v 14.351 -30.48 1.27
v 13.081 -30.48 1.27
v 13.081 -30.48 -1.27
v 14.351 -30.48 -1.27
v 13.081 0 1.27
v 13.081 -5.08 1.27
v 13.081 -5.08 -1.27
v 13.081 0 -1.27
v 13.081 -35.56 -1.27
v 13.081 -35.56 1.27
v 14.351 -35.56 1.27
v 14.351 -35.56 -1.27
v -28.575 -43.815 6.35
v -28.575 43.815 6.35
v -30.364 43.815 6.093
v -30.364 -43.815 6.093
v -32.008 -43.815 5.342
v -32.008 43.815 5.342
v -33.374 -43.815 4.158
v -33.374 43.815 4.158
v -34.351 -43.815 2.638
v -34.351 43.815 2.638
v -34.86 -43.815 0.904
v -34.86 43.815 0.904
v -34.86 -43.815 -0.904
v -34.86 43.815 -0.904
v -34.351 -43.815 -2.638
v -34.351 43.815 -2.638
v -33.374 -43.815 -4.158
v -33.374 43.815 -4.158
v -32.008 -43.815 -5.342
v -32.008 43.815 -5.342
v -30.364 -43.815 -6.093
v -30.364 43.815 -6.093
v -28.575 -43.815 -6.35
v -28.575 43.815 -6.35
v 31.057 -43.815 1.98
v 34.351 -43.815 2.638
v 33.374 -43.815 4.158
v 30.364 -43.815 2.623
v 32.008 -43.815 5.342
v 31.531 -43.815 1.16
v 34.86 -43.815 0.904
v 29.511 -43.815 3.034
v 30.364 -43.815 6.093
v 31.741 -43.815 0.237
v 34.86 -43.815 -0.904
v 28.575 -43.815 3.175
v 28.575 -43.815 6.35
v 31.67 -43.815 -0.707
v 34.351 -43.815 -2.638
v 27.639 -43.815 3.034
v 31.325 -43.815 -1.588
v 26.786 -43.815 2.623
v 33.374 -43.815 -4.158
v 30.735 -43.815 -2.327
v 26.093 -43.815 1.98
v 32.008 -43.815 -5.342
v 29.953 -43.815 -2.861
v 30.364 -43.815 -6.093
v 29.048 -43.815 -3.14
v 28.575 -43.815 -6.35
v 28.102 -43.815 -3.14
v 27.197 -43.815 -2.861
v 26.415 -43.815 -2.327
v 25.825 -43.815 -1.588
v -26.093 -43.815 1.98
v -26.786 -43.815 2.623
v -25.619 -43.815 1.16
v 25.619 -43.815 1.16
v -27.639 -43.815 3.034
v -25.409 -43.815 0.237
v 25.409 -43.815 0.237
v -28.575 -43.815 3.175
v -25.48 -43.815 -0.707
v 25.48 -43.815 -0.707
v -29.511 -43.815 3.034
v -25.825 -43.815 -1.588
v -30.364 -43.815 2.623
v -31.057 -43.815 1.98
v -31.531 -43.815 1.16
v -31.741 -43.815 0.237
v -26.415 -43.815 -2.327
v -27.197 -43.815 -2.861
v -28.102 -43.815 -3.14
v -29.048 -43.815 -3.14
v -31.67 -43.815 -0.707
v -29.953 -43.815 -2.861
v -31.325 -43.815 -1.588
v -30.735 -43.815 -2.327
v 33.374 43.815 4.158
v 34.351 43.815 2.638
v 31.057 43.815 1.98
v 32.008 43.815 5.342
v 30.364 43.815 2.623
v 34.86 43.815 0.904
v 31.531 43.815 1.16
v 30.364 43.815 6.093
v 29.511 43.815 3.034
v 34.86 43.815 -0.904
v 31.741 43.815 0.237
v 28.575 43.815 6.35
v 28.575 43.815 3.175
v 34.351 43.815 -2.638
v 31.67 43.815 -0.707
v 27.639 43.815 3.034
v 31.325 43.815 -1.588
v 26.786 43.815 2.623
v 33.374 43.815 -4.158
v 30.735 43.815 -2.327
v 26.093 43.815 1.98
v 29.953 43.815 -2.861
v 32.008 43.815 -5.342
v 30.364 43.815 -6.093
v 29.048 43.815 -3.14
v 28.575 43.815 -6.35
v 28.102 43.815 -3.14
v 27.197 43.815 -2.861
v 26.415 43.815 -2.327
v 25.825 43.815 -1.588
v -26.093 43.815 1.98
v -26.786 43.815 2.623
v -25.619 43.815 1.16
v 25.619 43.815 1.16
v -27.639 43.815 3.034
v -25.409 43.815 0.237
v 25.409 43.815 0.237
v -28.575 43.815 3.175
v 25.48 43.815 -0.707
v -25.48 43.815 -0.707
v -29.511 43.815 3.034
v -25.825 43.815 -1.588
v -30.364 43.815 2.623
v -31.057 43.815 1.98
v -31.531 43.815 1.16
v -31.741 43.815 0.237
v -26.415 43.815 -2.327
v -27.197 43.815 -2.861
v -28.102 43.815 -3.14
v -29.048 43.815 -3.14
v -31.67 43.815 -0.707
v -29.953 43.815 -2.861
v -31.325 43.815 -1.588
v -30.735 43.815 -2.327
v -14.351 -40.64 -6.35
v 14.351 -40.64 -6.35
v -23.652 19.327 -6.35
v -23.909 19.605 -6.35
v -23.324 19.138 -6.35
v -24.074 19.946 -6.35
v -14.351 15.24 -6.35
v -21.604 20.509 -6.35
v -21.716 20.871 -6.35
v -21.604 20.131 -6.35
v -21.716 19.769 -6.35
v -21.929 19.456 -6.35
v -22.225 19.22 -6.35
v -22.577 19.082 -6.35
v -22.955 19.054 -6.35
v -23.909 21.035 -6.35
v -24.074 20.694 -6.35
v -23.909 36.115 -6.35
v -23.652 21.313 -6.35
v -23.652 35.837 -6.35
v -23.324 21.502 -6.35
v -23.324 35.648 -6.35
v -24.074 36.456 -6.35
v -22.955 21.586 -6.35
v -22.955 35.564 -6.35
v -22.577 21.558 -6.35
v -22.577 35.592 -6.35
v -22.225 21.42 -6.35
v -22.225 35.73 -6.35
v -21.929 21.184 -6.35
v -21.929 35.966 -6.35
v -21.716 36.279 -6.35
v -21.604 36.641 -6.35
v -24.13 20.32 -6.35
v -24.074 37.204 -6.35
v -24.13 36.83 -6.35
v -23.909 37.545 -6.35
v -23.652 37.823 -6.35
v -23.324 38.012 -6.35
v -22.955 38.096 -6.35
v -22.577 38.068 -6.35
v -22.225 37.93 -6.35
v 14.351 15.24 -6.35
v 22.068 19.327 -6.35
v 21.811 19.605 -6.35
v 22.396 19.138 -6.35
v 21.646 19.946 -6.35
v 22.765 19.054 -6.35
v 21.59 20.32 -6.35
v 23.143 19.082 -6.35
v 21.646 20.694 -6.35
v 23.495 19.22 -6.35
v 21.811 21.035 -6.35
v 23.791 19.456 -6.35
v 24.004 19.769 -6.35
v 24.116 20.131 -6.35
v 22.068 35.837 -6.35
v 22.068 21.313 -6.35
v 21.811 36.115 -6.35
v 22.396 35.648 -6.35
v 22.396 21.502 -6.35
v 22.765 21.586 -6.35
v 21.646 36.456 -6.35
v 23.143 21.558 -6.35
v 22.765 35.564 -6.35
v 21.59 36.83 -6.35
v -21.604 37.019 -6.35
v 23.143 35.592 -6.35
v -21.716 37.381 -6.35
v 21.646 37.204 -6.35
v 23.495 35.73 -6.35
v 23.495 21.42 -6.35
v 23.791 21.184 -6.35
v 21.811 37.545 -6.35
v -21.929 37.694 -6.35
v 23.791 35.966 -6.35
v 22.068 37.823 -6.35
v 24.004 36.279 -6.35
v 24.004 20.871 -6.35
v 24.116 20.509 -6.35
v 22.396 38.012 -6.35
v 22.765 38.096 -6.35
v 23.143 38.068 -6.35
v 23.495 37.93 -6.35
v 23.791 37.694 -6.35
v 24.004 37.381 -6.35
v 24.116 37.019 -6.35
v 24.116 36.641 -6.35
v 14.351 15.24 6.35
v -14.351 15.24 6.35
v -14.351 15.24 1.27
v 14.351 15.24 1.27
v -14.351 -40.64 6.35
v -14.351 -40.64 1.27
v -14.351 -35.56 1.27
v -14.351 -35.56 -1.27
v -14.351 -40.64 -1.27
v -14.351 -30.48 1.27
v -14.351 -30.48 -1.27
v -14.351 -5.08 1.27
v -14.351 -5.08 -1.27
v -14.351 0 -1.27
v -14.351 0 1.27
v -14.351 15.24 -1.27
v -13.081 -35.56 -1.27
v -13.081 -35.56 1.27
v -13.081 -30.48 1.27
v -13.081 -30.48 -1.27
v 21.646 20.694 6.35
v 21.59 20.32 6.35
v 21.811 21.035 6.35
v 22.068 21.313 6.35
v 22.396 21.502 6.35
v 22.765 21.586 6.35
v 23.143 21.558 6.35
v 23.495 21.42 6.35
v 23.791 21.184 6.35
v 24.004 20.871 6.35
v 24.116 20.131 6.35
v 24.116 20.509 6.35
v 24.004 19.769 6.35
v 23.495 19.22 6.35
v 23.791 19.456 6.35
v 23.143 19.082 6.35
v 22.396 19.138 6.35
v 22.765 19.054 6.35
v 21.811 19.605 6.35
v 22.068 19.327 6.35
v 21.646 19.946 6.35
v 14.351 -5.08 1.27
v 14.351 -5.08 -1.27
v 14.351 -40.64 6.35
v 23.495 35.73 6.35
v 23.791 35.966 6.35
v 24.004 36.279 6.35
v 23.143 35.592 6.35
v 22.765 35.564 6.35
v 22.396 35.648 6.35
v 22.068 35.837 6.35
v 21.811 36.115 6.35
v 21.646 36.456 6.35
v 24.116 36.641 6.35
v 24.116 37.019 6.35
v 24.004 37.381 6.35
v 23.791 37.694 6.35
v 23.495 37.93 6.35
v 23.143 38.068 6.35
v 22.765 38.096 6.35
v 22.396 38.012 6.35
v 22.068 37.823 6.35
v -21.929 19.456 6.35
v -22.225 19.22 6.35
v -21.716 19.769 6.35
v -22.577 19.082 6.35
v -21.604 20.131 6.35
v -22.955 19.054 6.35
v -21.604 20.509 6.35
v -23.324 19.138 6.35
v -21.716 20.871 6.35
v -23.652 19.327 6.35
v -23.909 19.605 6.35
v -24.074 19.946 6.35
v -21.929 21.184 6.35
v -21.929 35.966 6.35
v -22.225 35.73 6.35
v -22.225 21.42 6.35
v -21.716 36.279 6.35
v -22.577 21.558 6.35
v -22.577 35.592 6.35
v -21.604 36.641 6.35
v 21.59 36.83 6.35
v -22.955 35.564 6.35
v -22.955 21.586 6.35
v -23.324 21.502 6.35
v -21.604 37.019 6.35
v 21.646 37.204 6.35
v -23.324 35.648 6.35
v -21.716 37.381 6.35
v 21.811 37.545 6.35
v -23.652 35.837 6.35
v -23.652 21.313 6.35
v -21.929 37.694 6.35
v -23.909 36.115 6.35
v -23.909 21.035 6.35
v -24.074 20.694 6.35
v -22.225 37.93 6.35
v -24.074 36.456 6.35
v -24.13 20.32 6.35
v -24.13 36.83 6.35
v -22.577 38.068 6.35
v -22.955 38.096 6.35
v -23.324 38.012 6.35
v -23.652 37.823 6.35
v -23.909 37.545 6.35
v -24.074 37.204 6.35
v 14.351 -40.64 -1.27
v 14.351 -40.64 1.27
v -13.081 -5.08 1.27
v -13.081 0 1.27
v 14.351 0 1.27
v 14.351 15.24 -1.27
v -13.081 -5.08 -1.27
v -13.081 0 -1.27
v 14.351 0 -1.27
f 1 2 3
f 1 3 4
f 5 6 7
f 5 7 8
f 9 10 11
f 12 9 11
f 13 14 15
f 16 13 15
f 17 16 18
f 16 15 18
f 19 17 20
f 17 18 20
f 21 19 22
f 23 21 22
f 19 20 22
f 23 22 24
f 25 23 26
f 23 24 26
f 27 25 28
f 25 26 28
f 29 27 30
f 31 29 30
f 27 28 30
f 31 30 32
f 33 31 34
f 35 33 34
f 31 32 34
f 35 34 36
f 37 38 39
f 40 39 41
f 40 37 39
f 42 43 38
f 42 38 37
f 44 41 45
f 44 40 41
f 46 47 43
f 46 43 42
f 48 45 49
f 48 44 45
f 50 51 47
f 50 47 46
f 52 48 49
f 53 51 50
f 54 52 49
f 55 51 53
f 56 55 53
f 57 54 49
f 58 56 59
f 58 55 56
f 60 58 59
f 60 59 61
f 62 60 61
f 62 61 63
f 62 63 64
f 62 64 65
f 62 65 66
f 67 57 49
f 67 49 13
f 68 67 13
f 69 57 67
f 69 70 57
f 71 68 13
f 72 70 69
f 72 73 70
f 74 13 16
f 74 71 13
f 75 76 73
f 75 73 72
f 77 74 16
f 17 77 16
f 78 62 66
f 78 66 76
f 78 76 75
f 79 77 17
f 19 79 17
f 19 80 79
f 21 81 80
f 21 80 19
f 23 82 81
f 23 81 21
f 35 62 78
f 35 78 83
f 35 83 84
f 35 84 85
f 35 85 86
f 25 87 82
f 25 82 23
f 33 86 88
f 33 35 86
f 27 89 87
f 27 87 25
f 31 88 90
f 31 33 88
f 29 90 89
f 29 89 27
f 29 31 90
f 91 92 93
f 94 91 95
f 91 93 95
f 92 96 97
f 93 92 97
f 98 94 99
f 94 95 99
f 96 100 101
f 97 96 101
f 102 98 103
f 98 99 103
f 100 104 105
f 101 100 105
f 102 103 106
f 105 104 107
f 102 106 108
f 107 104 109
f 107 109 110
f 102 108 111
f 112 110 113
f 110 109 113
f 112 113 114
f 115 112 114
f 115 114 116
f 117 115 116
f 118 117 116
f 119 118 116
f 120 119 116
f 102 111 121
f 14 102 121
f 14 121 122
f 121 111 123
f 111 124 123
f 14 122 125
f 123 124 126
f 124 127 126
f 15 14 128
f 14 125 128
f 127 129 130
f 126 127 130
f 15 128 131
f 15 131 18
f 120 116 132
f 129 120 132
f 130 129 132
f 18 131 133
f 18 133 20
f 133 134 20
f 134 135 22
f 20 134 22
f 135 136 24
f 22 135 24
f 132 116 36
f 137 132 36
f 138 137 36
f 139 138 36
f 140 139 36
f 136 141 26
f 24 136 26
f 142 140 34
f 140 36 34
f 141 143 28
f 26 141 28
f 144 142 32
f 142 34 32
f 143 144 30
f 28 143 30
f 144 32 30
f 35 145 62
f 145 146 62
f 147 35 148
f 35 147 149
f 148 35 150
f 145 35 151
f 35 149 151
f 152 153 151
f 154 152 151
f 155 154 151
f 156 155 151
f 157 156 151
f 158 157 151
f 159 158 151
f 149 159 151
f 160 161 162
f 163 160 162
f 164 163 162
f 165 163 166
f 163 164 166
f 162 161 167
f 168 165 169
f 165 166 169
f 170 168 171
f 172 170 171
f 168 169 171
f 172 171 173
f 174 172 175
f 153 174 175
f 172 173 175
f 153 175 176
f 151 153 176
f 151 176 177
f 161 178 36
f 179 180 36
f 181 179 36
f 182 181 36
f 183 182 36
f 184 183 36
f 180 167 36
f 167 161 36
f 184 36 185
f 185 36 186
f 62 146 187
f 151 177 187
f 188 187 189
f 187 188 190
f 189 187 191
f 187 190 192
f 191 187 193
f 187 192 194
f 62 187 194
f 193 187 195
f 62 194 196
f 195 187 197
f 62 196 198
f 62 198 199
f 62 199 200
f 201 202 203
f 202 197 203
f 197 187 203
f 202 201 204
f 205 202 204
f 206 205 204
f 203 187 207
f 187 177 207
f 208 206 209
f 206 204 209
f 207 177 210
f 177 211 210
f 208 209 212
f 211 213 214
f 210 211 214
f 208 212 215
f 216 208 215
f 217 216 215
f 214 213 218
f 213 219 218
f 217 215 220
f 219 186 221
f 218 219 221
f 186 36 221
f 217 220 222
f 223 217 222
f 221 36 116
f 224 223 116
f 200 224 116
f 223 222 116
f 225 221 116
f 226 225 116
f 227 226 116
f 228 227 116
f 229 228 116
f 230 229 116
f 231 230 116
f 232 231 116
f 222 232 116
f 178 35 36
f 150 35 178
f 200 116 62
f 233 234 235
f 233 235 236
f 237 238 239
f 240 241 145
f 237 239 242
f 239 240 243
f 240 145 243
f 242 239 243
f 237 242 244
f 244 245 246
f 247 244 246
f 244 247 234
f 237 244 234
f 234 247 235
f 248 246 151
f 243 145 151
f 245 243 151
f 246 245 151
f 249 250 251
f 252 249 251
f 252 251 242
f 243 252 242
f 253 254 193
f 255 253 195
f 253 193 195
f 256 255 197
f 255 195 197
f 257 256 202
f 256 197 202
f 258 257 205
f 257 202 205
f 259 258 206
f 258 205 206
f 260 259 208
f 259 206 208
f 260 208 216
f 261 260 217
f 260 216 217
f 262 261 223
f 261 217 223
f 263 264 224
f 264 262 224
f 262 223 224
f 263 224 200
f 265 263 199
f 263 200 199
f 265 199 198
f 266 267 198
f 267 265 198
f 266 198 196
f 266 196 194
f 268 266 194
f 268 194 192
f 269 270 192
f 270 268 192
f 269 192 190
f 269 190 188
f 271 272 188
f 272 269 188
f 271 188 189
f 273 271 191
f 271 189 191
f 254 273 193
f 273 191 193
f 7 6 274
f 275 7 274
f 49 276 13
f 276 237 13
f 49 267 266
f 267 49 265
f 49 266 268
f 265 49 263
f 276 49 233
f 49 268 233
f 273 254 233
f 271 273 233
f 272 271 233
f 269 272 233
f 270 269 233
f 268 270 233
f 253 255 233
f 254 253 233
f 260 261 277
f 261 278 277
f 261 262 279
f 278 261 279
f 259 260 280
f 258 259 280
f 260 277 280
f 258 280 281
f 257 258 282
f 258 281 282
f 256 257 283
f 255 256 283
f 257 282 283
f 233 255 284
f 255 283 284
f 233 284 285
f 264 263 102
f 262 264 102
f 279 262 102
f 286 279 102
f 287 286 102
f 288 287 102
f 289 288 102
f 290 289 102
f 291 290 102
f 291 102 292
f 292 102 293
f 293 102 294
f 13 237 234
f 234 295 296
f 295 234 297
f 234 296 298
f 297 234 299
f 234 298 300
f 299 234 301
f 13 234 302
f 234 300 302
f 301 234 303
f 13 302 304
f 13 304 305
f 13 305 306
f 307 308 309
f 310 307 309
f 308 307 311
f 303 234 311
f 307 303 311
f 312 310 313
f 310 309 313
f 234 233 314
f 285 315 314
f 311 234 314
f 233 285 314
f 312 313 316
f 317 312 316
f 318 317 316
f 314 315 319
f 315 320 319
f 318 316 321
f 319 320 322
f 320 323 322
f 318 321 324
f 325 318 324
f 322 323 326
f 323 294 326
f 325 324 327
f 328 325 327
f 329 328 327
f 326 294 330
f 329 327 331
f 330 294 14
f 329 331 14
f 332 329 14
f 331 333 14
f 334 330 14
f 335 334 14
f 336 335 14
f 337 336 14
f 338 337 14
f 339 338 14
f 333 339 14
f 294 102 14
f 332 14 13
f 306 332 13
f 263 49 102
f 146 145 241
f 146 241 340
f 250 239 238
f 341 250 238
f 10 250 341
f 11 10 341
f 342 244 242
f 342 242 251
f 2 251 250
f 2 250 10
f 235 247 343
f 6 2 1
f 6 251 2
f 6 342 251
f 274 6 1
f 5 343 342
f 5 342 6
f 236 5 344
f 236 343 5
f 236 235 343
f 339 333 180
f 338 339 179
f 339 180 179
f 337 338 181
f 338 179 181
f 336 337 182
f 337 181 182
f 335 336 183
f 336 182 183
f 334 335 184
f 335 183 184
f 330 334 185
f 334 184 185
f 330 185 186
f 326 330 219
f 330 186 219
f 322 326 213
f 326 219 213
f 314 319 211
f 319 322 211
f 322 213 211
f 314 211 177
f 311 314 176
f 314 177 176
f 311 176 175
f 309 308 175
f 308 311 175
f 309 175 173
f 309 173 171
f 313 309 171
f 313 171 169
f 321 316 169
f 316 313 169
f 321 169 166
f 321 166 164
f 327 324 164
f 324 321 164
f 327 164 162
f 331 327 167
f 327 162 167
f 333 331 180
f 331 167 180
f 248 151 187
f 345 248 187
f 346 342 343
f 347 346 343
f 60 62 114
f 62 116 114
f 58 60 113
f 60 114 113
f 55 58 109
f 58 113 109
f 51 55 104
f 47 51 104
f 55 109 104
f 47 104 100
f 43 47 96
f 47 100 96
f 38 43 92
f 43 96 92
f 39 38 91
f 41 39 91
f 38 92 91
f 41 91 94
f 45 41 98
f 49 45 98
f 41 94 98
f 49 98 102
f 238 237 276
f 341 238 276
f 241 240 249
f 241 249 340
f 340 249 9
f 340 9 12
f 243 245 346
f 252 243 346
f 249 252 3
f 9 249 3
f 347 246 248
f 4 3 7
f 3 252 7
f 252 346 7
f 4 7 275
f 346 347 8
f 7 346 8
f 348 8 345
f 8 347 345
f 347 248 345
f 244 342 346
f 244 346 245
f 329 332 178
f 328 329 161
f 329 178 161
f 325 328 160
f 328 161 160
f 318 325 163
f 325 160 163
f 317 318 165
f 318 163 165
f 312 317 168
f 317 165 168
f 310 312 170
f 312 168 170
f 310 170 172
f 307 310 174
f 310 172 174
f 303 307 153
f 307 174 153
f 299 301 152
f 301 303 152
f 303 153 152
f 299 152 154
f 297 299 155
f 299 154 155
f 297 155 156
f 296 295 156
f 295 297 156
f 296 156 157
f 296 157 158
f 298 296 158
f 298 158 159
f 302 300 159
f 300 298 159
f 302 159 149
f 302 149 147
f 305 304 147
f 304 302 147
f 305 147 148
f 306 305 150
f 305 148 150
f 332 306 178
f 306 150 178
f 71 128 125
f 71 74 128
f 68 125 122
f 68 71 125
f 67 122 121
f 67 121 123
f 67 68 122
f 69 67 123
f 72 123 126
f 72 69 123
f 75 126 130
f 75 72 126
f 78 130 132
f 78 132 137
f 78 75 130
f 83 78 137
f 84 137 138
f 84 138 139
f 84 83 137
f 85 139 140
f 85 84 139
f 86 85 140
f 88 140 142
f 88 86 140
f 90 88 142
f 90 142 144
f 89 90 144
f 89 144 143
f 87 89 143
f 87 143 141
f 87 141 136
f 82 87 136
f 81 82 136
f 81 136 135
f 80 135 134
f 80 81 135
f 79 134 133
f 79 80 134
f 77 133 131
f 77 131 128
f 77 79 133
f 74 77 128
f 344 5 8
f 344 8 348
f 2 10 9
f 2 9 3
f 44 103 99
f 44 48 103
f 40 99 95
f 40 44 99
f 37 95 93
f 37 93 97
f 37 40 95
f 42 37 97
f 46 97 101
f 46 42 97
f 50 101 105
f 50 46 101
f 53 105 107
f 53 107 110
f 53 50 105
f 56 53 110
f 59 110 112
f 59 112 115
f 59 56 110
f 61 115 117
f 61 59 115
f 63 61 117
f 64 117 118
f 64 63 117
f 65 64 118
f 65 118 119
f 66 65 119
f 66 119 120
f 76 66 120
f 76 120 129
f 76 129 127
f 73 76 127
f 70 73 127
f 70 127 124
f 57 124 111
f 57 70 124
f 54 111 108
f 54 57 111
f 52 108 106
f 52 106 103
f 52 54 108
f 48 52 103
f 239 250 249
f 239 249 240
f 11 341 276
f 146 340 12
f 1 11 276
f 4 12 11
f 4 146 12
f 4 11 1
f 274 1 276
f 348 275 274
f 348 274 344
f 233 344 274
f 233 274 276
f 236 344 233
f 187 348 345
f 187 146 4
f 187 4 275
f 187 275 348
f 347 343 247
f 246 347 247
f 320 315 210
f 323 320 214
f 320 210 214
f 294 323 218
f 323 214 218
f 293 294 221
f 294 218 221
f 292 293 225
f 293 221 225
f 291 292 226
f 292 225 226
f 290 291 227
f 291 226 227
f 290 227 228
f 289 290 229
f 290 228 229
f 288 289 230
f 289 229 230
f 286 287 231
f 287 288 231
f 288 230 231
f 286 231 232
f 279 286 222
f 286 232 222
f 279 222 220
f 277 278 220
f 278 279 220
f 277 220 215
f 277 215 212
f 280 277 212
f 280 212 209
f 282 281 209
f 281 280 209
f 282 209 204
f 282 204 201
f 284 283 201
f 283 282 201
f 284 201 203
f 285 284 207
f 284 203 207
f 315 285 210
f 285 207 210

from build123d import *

# Parameters (mm, degrees)
SKETCH2_R           = 3.175
BOSS_EXTRUDE1_DEPTH = 43.815
SKETCH5_R           = 1.27
CUT_EXTRUDE1_DEPTH  = 5.08
SKETCH6_R           = 1.27
CUT_EXTRUDE2_DEPTH  = 58.452587844
SKETCH7_W           = 28.702
SKETCH7_H           = 55.88
CUT_EXTRUDE3_DEPTH  = 5.08
SKETCH8_W           = 1.27
SKETCH8_H           = 5.08
CUT_EXTRUDE4_DEPTH  = 57.547097627


with BuildPart() as part:
    # Sketch2 → Boss-Extrude1 (new, symmetric)
    with BuildSketch(Plane(origin=(0, 0, 0), x_dir=(1, 0, 0), z_dir=(0, 1, 0))):
        with BuildLine():
            Line((-28.575, 6.35), (28.575, 6.35))
            ThreePointArc((28.575, 6.35), (34.925, 0), (28.575, -6.35))
            Line((28.575, -6.35), (-28.575, -6.35))
            ThreePointArc((-28.575, -6.35), (-34.925, 0), (-28.575, 6.35))
        make_face()
        with Locations(Location((28.575, 0, 0), (0, 0, 270))):
            Circle(SKETCH2_R, mode=Mode.SUBTRACT)
        with Locations(Location((-28.575, 0, 0), (0, 0, 270))):
            Circle(SKETCH2_R, mode=Mode.SUBTRACT)
    extrude(amount=BOSS_EXTRUDE1_DEPTH, both=True)

    # Sketch5 → Cut-Extrude1 (cut)
    with BuildSketch(Plane(origin=(0, 0, -6.35), x_dir=(-1, 0, 0), z_dir=(0, 0, -1))):
        with Locations((22.86, 36.83)):
            Circle(SKETCH5_R)
        with Locations((22.86, 20.32)):
            Circle(SKETCH5_R)
        with Locations((-22.86, 36.83)):
            Circle(SKETCH5_R)
        with Locations((-22.86, 20.32)):
            Circle(SKETCH5_R)
    extrude(amount=-CUT_EXTRUDE1_DEPTH, mode=Mode.SUBTRACT)

    # Sketch6 → Cut-Extrude2 (cut, through all)
    with BuildSketch(Plane.XY.offset(6.35)):
        with Locations(Location((22.86, 36.83, 0), (0, 0, 180))):
            Circle(SKETCH6_R)
        with Locations(Location((22.86, 20.32, 0), (0, 0, 180))):
            Circle(SKETCH6_R)
        with Locations(Location((-22.86, 36.83, 0), (0, 0, 180))):
            Circle(SKETCH6_R)
        with Locations(Location((-22.86, 20.32, 0), (0, 0, 180))):
            Circle(SKETCH6_R)
    extrude(amount=-CUT_EXTRUDE2_DEPTH, mode=Mode.SUBTRACT)

    # Sketch7 → Cut-Extrude3 (cut)
    with BuildSketch(Plane.XY.offset(6.35)):
        with Locations((0, -12.7)):
            Rectangle(SKETCH7_W, SKETCH7_H)
    cut_extrude3 = extrude(amount=-CUT_EXTRUDE3_DEPTH, mode=Mode.SUBTRACT)

    # Mirror1: Cut-Extrude3 across plane
    add(cut_extrude3.mirror(Plane.XY), mode=Mode.SUBTRACT)

    # Sketch8 → Cut-Extrude4 (cut, through all)
    with BuildSketch(Plane.XY.offset(1.27)):
        with Locations((13.716, -33.02)):
            Rectangle(SKETCH8_W, SKETCH8_H)
        with Locations((13.716, -2.54)):
            Rectangle(SKETCH8_W, SKETCH8_H)
    cut_extrude4 = extrude(amount=-CUT_EXTRUDE4_DEPTH, mode=Mode.SUBTRACT)

    # Mirror2: Cut-Extrude4 across plane
    add(cut_extrude4.mirror(Plane(origin=(0, 0, 0), x_dir=(0, 0, 1), z_dir=(1, 0, 0))), mode=Mode.SUBTRACT)


solid = part.part
